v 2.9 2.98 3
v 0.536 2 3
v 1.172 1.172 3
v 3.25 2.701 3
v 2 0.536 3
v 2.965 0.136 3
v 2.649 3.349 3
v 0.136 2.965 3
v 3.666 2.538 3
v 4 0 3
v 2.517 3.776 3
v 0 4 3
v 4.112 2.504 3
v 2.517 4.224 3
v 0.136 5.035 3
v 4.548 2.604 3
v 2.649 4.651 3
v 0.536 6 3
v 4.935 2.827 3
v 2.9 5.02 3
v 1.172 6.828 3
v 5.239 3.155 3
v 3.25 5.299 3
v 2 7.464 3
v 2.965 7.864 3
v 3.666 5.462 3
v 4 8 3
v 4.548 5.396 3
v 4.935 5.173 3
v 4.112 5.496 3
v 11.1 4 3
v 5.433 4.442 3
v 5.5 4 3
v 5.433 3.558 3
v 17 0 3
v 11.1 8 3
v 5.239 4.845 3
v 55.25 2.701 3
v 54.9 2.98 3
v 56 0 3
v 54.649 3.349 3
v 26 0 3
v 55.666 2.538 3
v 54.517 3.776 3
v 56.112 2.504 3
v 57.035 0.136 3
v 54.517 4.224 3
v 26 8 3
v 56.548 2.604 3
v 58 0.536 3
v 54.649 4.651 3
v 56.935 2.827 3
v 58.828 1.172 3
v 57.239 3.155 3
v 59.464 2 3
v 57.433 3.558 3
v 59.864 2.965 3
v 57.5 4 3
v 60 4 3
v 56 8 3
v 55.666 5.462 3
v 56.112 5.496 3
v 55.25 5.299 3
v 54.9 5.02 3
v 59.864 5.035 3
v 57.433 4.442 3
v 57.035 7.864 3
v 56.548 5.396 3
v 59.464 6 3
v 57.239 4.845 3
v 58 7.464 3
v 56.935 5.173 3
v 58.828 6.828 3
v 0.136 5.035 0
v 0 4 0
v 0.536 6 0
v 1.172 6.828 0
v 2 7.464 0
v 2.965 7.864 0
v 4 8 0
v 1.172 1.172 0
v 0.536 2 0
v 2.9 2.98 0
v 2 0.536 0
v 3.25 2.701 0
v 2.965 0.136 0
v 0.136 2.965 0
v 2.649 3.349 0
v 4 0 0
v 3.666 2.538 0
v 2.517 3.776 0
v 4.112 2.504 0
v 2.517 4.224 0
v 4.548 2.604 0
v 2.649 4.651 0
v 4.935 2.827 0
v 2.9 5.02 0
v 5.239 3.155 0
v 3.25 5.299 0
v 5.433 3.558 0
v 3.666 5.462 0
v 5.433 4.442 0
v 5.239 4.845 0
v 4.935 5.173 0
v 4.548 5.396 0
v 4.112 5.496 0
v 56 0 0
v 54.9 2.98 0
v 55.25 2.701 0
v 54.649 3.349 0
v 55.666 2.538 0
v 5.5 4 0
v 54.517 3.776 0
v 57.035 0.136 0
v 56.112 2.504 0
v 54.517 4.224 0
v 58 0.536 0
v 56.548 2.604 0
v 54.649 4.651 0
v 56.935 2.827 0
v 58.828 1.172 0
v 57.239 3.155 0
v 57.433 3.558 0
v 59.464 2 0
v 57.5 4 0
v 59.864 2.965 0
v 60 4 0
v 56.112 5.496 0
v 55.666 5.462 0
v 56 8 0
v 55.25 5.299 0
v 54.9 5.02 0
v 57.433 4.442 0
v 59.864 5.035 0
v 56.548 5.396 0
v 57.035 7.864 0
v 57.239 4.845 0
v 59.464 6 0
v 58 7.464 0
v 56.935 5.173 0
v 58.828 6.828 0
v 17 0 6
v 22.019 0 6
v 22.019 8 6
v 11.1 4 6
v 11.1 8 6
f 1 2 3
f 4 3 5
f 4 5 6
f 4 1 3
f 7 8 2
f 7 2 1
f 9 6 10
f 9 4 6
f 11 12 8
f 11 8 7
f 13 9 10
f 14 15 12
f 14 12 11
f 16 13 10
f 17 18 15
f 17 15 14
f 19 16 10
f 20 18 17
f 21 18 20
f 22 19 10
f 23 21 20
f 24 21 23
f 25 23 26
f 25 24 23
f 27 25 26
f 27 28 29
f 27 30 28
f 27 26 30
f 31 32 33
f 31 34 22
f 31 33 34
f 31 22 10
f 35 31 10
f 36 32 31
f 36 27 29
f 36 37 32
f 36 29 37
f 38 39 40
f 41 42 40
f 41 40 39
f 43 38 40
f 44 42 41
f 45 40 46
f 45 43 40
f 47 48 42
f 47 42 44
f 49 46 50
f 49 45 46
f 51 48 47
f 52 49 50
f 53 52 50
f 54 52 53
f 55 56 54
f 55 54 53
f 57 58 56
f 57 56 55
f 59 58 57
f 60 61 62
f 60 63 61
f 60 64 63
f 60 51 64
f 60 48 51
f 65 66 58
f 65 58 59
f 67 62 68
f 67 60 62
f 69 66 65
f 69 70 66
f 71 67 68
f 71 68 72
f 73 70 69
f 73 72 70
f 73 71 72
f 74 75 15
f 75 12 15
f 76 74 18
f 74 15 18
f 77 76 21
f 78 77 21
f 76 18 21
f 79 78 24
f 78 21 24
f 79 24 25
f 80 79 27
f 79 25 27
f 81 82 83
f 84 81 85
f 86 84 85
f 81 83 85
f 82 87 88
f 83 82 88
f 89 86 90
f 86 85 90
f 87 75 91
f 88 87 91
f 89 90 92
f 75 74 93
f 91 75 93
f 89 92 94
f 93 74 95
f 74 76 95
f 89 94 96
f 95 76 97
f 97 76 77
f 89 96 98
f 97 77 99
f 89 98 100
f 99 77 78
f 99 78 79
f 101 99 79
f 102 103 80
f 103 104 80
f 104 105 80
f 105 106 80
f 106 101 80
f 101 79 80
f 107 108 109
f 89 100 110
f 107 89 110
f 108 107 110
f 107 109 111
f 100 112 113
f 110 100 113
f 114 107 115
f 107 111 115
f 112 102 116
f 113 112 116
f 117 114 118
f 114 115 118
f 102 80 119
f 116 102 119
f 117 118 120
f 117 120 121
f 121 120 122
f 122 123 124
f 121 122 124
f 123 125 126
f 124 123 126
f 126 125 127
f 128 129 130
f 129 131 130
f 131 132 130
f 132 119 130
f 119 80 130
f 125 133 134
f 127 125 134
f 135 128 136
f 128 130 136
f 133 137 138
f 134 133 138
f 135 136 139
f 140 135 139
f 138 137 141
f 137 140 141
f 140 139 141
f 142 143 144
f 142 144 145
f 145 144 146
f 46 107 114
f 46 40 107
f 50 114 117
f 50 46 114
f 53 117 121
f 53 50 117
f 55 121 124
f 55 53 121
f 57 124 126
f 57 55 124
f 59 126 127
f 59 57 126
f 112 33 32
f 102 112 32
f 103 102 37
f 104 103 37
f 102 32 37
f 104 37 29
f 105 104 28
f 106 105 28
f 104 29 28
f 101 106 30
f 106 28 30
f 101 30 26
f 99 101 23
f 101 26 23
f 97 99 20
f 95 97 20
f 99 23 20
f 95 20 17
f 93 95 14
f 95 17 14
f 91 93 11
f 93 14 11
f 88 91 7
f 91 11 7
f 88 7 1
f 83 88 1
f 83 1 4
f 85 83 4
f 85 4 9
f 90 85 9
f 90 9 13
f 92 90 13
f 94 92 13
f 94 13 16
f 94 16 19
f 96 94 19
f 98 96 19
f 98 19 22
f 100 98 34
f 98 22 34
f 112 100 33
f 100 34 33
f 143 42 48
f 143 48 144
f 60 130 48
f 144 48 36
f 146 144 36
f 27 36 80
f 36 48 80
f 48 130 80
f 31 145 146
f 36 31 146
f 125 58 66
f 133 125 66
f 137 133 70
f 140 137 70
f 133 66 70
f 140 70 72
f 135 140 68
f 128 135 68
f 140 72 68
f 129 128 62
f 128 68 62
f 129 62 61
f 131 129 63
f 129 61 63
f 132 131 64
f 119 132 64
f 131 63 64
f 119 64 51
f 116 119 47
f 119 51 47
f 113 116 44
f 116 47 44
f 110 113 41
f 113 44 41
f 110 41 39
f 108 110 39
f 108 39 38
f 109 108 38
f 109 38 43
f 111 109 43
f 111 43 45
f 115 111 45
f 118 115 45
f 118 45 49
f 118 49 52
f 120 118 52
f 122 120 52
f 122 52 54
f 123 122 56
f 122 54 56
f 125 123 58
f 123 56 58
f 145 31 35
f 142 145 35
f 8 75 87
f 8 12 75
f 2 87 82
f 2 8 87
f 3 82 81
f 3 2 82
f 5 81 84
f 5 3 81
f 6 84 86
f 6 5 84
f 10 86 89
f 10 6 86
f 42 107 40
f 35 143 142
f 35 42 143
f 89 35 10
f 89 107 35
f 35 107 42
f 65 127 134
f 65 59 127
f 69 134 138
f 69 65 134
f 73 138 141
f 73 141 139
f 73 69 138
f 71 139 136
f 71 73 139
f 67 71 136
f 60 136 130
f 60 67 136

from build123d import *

# Parameters (mm, degrees)
SZKIC1_W                    = 60
SZKIC1_H                    = 8
DODANIE_WYCI_GNI_CIE1_DEPTH = 3
ZAOKR_GLENIE1_R             = 4
SZKIC2_R                    = 1.5
WYTNIJ_WYCI_GNI_CIE1_DEPTH  = 3
DODANIE_WYCI_GNI_CIE2_DEPTH = 3
SFAZOWANIE1_SIZE            = 4
SFAZOWANIE1_SIZE_2          = 3.0142162
WYTNIJ_WYCI_GNI_CIE2_DEPTH  = 3


# Some blends are built 0.0001 mm under size
with BuildPart() as part:
    # Szkic1 → Dodanie-wyciągnięcie1 (new body)
    with BuildSketch(Plane.XY):
        with Locations((30, 4)):
            Rectangle(SZKIC1_W, SZKIC1_H)
    extrude(amount=DODANIE_WYCI_GNI_CIE1_DEPTH)

    # Zaokrąglenie1
    zaokr_glenie1_edges = [part.edges().sort_by_distance(p)[0] for p in [
        (60, 0, 1.5),
        (60, 8, 1.5),
        (0, 8, 1.5),
        (0, 0, 1.5),
    ]]
    fillet(zaokr_glenie1_edges, radius=ZAOKR_GLENIE1_R - 0.0001)  # a hair under: the kernel refuses the full size

    # Szkic2 → Wytnij-wyciągnięcie1 (cut)
    with BuildSketch(Plane.XY.offset(3)):
        with Locations((4, 4)):
            Circle(SZKIC2_R)
        with Locations((56, 4)):
            Circle(SZKIC2_R)
    extrude(amount=-WYTNIJ_WYCI_GNI_CIE1_DEPTH, mode=Mode.SUBTRACT)

    # Szkic3 → Dodanie-wyciągnięcie2 (add)
    with BuildSketch(Plane.XY.offset(3)):
        Polygon((5.2, 8), (17, 0), (22, 0), (22, 8), align=None)
    extrude(amount=DODANIE_WYCI_GNI_CIE2_DEPTH)

    # Sfazowanie1
    # the kernel refuses this chamfer: 4, 3.0142162 mm, written as the material it adds along each edge
    with BuildSketch(Plane(origin=(22, 0, 3), x_dir=(0.9997280272590686, 0, -0.023321052992758322), z_dir=(0, 1, 0))) as sfazowanie1_piece_1_section:
        Polygon((SFAZOWANIE1_SIZE * 0.999728027259, -SFAZOWANIE1_SIZE * 0.0233210529928), (-SFAZOWANIE1_SIZE_2 * 0.0233210529959, -SFAZOWANIE1_SIZE_2 * 0.999728027395), (0, 0), align=None)
    sfazowanie1_piece_1 = extrude(amount=8, mode=Mode.PRIVATE)
    sfazowanie1_piece_1 = split(sfazowanie1_piece_1, bisect_by=Plane(origin=(23.333090008, 4, 6), z_dir=(0, 0, -1)), keep=Keep.TOP, mode=Mode.PRIVATE)
    add(sfazowanie1_piece_1)

    # Szkic4 → Wytnij-wyciągnięcie2 (cut)
    with BuildSketch(Plane.XY.offset(6)):
        Polygon((5.2, 8), (11.1, 4), (11.1, 8), align=None)
    extrude(amount=-WYTNIJ_WYCI_GNI_CIE2_DEPTH, mode=Mode.SUBTRACT)


solid = part.part
